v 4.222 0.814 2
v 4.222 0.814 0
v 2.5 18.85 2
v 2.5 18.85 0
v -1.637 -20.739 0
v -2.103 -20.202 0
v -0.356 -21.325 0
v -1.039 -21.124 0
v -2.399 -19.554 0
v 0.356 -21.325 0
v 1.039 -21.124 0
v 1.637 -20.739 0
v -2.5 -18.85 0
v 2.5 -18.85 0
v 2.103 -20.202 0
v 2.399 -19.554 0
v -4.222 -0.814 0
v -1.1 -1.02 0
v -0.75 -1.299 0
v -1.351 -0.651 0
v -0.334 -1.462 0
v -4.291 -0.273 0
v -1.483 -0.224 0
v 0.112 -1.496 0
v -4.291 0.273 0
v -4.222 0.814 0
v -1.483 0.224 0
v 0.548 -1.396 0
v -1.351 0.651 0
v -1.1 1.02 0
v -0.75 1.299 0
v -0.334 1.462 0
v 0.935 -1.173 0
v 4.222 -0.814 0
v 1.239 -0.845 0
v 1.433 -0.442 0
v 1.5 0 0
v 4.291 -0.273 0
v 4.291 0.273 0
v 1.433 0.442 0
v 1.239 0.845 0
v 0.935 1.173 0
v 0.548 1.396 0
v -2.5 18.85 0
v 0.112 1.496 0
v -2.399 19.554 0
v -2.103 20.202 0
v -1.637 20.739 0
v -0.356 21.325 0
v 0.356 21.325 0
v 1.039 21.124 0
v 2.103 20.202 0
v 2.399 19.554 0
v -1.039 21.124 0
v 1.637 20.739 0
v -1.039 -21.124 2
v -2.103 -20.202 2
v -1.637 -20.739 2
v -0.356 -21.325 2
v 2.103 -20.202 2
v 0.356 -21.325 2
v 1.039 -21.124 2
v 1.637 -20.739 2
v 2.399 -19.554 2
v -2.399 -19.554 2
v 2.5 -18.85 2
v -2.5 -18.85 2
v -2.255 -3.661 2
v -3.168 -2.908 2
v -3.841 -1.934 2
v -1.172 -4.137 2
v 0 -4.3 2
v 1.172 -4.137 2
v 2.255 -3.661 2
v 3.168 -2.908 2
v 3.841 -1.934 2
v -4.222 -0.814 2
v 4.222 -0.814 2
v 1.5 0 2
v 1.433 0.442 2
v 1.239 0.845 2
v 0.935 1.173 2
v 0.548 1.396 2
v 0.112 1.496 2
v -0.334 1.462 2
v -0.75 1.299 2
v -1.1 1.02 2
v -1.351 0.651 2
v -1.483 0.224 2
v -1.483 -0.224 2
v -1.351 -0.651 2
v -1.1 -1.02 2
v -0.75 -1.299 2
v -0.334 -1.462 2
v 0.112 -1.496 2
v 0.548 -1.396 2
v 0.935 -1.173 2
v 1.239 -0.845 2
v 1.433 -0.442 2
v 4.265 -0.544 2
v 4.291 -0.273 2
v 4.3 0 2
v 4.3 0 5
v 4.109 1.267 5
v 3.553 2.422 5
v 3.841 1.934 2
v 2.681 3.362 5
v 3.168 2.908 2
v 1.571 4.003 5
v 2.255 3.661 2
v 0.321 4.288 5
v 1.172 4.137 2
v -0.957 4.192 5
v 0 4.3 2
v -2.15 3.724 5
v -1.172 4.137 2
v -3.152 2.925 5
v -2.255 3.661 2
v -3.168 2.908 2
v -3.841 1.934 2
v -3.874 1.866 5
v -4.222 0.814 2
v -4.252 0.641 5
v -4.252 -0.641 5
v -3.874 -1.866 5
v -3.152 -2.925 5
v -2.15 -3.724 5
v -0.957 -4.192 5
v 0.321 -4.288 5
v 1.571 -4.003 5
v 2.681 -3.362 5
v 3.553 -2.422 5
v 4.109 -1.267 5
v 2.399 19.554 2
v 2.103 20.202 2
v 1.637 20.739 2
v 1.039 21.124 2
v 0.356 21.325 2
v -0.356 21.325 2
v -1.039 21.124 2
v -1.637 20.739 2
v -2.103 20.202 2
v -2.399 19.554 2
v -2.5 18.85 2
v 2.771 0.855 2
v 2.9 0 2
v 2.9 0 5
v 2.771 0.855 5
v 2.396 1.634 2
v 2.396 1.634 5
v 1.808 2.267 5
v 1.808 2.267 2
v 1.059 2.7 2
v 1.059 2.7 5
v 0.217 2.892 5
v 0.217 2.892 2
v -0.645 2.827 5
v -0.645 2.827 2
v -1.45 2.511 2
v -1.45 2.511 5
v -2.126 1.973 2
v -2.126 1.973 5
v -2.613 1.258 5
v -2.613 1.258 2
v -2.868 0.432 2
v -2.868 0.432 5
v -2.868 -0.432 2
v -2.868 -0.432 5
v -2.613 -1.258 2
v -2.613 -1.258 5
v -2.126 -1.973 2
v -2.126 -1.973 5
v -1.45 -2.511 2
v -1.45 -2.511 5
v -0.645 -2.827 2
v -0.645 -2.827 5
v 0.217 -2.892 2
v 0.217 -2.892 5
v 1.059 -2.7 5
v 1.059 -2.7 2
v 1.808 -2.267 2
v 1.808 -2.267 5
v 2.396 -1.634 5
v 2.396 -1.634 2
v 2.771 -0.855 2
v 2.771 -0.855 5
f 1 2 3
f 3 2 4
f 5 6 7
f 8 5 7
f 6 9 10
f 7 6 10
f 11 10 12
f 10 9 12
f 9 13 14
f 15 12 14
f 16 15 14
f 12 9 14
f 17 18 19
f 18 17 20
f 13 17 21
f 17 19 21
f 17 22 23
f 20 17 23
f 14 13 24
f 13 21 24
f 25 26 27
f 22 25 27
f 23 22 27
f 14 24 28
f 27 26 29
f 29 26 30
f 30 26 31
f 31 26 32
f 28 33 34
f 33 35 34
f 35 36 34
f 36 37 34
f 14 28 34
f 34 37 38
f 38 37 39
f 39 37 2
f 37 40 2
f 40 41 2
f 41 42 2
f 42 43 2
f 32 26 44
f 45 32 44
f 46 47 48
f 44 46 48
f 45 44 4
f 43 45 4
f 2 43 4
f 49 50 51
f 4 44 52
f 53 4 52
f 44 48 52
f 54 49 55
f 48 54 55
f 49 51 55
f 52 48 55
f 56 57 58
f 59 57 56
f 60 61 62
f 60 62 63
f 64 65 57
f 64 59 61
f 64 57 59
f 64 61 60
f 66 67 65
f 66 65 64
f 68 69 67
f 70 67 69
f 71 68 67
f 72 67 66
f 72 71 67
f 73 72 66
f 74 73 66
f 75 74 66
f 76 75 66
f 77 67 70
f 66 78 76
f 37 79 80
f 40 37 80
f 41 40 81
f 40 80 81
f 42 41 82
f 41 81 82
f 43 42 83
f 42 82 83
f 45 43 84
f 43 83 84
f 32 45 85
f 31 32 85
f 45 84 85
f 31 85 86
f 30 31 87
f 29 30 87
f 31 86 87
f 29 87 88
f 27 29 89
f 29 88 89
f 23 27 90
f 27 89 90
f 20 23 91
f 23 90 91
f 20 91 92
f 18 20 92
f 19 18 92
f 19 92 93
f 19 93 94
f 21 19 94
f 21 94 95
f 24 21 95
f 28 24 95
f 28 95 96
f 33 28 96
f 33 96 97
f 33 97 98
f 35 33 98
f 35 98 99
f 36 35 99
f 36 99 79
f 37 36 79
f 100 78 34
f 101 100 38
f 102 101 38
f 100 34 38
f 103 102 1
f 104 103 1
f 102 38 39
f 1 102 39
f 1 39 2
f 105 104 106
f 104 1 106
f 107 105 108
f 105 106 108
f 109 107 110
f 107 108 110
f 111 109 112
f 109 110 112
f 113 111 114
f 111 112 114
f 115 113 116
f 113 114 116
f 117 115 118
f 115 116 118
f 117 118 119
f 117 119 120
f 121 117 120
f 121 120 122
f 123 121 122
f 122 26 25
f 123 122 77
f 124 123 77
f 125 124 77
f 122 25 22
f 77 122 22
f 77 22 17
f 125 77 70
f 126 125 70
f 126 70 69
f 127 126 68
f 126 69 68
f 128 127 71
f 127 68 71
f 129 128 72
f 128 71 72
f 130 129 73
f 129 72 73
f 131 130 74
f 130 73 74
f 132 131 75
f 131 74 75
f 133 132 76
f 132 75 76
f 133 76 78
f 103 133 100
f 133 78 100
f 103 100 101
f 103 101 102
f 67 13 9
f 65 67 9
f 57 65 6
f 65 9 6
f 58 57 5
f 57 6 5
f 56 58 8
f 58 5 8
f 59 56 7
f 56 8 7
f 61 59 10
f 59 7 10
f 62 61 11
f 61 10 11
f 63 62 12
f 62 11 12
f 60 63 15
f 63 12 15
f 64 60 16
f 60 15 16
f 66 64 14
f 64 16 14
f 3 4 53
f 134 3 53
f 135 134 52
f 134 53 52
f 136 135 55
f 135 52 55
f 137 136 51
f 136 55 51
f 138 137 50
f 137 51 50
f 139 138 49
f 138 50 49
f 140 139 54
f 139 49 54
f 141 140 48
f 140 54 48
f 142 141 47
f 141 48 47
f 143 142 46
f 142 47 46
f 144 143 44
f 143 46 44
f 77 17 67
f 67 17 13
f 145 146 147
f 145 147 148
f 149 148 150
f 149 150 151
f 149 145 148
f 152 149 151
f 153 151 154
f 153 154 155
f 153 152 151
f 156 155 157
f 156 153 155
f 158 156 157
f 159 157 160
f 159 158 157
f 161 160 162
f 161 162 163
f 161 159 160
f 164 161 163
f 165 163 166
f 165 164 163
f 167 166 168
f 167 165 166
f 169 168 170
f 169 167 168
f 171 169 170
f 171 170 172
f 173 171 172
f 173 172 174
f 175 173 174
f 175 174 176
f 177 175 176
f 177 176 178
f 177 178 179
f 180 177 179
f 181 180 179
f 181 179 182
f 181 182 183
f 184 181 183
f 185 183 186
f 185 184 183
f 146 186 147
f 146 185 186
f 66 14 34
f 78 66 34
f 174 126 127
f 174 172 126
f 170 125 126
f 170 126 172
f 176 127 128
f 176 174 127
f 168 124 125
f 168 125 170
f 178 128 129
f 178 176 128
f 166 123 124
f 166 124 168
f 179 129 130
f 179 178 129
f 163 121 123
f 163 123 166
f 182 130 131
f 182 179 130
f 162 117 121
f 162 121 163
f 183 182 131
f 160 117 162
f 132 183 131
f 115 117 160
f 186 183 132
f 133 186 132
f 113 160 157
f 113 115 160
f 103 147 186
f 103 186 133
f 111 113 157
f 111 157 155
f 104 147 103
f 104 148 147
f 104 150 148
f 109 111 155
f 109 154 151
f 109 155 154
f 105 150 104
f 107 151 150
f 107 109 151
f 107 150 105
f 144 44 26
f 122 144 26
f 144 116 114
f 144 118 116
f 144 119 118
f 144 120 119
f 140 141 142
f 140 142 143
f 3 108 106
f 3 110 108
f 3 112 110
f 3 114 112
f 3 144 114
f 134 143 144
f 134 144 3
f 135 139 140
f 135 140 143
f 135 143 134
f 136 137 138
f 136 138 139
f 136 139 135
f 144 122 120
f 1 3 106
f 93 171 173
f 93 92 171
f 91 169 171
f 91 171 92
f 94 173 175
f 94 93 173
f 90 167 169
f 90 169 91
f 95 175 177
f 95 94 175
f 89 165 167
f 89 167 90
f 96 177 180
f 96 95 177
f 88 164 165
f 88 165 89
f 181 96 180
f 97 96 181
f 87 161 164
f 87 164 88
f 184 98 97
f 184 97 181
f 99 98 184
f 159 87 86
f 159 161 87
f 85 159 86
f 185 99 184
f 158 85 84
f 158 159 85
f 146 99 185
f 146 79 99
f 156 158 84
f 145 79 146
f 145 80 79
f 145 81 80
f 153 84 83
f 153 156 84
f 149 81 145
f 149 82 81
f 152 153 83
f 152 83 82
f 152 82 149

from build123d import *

# Parameters (mm, degrees)
BOSS_EXTRUDE1_DEPTH = 2
SKETCH2_R           = 4.3
SKETCH2_R_2         = 2.9
BOSS_EXTRUDE2_DEPTH = 3
SKETCH3_R           = 1.5
CUT_EXTRUDE1_DEPTH  = 3


with BuildPart() as part:
    # Sketch1 → Boss-Extrude1 (new body)
    with BuildSketch(Plane.XY):
        with BuildLine():
            Line((-2.5, 18.85), (-4.222289698, 0.813799547))
            ThreePointArc((-4.222289698, 0.813799547), (-4.3, 0), (-4.222289698, -0.813799547))
            Line((-4.222289698, -0.813799547), (-2.5, -18.85))
            ThreePointArc((-2.5, -18.85), (0, -21.35), (2.5, -18.85))
            Line((2.5, -18.85), (4.222289698, -0.813799547))
            ThreePointArc((4.222289698, -0.813799547), (4.3, 0), (4.222289698, 0.813799547))
            Line((4.222289698, 0.813799547), (2.5, 18.85))
            ThreePointArc((2.5, 18.85), (0, 21.35), (-2.5, 18.85))
        make_face()
    extrude(amount=BOSS_EXTRUDE1_DEPTH)

    # Sketch2 → Boss-Extrude2 (add)
    with BuildSketch(Plane.XY.offset(2)):
        Circle(SKETCH2_R)
        Circle(SKETCH2_R_2, mode=Mode.SUBTRACT)
    extrude(amount=BOSS_EXTRUDE2_DEPTH)

    # Sketch3 → Cut-Extrude1 (cut, through all)
    with BuildSketch(Plane.XY.offset(2)):
        Circle(SKETCH3_R)
    extrude(amount=-CUT_EXTRUDE1_DEPTH, mode=Mode.SUBTRACT)


solid = part.part
